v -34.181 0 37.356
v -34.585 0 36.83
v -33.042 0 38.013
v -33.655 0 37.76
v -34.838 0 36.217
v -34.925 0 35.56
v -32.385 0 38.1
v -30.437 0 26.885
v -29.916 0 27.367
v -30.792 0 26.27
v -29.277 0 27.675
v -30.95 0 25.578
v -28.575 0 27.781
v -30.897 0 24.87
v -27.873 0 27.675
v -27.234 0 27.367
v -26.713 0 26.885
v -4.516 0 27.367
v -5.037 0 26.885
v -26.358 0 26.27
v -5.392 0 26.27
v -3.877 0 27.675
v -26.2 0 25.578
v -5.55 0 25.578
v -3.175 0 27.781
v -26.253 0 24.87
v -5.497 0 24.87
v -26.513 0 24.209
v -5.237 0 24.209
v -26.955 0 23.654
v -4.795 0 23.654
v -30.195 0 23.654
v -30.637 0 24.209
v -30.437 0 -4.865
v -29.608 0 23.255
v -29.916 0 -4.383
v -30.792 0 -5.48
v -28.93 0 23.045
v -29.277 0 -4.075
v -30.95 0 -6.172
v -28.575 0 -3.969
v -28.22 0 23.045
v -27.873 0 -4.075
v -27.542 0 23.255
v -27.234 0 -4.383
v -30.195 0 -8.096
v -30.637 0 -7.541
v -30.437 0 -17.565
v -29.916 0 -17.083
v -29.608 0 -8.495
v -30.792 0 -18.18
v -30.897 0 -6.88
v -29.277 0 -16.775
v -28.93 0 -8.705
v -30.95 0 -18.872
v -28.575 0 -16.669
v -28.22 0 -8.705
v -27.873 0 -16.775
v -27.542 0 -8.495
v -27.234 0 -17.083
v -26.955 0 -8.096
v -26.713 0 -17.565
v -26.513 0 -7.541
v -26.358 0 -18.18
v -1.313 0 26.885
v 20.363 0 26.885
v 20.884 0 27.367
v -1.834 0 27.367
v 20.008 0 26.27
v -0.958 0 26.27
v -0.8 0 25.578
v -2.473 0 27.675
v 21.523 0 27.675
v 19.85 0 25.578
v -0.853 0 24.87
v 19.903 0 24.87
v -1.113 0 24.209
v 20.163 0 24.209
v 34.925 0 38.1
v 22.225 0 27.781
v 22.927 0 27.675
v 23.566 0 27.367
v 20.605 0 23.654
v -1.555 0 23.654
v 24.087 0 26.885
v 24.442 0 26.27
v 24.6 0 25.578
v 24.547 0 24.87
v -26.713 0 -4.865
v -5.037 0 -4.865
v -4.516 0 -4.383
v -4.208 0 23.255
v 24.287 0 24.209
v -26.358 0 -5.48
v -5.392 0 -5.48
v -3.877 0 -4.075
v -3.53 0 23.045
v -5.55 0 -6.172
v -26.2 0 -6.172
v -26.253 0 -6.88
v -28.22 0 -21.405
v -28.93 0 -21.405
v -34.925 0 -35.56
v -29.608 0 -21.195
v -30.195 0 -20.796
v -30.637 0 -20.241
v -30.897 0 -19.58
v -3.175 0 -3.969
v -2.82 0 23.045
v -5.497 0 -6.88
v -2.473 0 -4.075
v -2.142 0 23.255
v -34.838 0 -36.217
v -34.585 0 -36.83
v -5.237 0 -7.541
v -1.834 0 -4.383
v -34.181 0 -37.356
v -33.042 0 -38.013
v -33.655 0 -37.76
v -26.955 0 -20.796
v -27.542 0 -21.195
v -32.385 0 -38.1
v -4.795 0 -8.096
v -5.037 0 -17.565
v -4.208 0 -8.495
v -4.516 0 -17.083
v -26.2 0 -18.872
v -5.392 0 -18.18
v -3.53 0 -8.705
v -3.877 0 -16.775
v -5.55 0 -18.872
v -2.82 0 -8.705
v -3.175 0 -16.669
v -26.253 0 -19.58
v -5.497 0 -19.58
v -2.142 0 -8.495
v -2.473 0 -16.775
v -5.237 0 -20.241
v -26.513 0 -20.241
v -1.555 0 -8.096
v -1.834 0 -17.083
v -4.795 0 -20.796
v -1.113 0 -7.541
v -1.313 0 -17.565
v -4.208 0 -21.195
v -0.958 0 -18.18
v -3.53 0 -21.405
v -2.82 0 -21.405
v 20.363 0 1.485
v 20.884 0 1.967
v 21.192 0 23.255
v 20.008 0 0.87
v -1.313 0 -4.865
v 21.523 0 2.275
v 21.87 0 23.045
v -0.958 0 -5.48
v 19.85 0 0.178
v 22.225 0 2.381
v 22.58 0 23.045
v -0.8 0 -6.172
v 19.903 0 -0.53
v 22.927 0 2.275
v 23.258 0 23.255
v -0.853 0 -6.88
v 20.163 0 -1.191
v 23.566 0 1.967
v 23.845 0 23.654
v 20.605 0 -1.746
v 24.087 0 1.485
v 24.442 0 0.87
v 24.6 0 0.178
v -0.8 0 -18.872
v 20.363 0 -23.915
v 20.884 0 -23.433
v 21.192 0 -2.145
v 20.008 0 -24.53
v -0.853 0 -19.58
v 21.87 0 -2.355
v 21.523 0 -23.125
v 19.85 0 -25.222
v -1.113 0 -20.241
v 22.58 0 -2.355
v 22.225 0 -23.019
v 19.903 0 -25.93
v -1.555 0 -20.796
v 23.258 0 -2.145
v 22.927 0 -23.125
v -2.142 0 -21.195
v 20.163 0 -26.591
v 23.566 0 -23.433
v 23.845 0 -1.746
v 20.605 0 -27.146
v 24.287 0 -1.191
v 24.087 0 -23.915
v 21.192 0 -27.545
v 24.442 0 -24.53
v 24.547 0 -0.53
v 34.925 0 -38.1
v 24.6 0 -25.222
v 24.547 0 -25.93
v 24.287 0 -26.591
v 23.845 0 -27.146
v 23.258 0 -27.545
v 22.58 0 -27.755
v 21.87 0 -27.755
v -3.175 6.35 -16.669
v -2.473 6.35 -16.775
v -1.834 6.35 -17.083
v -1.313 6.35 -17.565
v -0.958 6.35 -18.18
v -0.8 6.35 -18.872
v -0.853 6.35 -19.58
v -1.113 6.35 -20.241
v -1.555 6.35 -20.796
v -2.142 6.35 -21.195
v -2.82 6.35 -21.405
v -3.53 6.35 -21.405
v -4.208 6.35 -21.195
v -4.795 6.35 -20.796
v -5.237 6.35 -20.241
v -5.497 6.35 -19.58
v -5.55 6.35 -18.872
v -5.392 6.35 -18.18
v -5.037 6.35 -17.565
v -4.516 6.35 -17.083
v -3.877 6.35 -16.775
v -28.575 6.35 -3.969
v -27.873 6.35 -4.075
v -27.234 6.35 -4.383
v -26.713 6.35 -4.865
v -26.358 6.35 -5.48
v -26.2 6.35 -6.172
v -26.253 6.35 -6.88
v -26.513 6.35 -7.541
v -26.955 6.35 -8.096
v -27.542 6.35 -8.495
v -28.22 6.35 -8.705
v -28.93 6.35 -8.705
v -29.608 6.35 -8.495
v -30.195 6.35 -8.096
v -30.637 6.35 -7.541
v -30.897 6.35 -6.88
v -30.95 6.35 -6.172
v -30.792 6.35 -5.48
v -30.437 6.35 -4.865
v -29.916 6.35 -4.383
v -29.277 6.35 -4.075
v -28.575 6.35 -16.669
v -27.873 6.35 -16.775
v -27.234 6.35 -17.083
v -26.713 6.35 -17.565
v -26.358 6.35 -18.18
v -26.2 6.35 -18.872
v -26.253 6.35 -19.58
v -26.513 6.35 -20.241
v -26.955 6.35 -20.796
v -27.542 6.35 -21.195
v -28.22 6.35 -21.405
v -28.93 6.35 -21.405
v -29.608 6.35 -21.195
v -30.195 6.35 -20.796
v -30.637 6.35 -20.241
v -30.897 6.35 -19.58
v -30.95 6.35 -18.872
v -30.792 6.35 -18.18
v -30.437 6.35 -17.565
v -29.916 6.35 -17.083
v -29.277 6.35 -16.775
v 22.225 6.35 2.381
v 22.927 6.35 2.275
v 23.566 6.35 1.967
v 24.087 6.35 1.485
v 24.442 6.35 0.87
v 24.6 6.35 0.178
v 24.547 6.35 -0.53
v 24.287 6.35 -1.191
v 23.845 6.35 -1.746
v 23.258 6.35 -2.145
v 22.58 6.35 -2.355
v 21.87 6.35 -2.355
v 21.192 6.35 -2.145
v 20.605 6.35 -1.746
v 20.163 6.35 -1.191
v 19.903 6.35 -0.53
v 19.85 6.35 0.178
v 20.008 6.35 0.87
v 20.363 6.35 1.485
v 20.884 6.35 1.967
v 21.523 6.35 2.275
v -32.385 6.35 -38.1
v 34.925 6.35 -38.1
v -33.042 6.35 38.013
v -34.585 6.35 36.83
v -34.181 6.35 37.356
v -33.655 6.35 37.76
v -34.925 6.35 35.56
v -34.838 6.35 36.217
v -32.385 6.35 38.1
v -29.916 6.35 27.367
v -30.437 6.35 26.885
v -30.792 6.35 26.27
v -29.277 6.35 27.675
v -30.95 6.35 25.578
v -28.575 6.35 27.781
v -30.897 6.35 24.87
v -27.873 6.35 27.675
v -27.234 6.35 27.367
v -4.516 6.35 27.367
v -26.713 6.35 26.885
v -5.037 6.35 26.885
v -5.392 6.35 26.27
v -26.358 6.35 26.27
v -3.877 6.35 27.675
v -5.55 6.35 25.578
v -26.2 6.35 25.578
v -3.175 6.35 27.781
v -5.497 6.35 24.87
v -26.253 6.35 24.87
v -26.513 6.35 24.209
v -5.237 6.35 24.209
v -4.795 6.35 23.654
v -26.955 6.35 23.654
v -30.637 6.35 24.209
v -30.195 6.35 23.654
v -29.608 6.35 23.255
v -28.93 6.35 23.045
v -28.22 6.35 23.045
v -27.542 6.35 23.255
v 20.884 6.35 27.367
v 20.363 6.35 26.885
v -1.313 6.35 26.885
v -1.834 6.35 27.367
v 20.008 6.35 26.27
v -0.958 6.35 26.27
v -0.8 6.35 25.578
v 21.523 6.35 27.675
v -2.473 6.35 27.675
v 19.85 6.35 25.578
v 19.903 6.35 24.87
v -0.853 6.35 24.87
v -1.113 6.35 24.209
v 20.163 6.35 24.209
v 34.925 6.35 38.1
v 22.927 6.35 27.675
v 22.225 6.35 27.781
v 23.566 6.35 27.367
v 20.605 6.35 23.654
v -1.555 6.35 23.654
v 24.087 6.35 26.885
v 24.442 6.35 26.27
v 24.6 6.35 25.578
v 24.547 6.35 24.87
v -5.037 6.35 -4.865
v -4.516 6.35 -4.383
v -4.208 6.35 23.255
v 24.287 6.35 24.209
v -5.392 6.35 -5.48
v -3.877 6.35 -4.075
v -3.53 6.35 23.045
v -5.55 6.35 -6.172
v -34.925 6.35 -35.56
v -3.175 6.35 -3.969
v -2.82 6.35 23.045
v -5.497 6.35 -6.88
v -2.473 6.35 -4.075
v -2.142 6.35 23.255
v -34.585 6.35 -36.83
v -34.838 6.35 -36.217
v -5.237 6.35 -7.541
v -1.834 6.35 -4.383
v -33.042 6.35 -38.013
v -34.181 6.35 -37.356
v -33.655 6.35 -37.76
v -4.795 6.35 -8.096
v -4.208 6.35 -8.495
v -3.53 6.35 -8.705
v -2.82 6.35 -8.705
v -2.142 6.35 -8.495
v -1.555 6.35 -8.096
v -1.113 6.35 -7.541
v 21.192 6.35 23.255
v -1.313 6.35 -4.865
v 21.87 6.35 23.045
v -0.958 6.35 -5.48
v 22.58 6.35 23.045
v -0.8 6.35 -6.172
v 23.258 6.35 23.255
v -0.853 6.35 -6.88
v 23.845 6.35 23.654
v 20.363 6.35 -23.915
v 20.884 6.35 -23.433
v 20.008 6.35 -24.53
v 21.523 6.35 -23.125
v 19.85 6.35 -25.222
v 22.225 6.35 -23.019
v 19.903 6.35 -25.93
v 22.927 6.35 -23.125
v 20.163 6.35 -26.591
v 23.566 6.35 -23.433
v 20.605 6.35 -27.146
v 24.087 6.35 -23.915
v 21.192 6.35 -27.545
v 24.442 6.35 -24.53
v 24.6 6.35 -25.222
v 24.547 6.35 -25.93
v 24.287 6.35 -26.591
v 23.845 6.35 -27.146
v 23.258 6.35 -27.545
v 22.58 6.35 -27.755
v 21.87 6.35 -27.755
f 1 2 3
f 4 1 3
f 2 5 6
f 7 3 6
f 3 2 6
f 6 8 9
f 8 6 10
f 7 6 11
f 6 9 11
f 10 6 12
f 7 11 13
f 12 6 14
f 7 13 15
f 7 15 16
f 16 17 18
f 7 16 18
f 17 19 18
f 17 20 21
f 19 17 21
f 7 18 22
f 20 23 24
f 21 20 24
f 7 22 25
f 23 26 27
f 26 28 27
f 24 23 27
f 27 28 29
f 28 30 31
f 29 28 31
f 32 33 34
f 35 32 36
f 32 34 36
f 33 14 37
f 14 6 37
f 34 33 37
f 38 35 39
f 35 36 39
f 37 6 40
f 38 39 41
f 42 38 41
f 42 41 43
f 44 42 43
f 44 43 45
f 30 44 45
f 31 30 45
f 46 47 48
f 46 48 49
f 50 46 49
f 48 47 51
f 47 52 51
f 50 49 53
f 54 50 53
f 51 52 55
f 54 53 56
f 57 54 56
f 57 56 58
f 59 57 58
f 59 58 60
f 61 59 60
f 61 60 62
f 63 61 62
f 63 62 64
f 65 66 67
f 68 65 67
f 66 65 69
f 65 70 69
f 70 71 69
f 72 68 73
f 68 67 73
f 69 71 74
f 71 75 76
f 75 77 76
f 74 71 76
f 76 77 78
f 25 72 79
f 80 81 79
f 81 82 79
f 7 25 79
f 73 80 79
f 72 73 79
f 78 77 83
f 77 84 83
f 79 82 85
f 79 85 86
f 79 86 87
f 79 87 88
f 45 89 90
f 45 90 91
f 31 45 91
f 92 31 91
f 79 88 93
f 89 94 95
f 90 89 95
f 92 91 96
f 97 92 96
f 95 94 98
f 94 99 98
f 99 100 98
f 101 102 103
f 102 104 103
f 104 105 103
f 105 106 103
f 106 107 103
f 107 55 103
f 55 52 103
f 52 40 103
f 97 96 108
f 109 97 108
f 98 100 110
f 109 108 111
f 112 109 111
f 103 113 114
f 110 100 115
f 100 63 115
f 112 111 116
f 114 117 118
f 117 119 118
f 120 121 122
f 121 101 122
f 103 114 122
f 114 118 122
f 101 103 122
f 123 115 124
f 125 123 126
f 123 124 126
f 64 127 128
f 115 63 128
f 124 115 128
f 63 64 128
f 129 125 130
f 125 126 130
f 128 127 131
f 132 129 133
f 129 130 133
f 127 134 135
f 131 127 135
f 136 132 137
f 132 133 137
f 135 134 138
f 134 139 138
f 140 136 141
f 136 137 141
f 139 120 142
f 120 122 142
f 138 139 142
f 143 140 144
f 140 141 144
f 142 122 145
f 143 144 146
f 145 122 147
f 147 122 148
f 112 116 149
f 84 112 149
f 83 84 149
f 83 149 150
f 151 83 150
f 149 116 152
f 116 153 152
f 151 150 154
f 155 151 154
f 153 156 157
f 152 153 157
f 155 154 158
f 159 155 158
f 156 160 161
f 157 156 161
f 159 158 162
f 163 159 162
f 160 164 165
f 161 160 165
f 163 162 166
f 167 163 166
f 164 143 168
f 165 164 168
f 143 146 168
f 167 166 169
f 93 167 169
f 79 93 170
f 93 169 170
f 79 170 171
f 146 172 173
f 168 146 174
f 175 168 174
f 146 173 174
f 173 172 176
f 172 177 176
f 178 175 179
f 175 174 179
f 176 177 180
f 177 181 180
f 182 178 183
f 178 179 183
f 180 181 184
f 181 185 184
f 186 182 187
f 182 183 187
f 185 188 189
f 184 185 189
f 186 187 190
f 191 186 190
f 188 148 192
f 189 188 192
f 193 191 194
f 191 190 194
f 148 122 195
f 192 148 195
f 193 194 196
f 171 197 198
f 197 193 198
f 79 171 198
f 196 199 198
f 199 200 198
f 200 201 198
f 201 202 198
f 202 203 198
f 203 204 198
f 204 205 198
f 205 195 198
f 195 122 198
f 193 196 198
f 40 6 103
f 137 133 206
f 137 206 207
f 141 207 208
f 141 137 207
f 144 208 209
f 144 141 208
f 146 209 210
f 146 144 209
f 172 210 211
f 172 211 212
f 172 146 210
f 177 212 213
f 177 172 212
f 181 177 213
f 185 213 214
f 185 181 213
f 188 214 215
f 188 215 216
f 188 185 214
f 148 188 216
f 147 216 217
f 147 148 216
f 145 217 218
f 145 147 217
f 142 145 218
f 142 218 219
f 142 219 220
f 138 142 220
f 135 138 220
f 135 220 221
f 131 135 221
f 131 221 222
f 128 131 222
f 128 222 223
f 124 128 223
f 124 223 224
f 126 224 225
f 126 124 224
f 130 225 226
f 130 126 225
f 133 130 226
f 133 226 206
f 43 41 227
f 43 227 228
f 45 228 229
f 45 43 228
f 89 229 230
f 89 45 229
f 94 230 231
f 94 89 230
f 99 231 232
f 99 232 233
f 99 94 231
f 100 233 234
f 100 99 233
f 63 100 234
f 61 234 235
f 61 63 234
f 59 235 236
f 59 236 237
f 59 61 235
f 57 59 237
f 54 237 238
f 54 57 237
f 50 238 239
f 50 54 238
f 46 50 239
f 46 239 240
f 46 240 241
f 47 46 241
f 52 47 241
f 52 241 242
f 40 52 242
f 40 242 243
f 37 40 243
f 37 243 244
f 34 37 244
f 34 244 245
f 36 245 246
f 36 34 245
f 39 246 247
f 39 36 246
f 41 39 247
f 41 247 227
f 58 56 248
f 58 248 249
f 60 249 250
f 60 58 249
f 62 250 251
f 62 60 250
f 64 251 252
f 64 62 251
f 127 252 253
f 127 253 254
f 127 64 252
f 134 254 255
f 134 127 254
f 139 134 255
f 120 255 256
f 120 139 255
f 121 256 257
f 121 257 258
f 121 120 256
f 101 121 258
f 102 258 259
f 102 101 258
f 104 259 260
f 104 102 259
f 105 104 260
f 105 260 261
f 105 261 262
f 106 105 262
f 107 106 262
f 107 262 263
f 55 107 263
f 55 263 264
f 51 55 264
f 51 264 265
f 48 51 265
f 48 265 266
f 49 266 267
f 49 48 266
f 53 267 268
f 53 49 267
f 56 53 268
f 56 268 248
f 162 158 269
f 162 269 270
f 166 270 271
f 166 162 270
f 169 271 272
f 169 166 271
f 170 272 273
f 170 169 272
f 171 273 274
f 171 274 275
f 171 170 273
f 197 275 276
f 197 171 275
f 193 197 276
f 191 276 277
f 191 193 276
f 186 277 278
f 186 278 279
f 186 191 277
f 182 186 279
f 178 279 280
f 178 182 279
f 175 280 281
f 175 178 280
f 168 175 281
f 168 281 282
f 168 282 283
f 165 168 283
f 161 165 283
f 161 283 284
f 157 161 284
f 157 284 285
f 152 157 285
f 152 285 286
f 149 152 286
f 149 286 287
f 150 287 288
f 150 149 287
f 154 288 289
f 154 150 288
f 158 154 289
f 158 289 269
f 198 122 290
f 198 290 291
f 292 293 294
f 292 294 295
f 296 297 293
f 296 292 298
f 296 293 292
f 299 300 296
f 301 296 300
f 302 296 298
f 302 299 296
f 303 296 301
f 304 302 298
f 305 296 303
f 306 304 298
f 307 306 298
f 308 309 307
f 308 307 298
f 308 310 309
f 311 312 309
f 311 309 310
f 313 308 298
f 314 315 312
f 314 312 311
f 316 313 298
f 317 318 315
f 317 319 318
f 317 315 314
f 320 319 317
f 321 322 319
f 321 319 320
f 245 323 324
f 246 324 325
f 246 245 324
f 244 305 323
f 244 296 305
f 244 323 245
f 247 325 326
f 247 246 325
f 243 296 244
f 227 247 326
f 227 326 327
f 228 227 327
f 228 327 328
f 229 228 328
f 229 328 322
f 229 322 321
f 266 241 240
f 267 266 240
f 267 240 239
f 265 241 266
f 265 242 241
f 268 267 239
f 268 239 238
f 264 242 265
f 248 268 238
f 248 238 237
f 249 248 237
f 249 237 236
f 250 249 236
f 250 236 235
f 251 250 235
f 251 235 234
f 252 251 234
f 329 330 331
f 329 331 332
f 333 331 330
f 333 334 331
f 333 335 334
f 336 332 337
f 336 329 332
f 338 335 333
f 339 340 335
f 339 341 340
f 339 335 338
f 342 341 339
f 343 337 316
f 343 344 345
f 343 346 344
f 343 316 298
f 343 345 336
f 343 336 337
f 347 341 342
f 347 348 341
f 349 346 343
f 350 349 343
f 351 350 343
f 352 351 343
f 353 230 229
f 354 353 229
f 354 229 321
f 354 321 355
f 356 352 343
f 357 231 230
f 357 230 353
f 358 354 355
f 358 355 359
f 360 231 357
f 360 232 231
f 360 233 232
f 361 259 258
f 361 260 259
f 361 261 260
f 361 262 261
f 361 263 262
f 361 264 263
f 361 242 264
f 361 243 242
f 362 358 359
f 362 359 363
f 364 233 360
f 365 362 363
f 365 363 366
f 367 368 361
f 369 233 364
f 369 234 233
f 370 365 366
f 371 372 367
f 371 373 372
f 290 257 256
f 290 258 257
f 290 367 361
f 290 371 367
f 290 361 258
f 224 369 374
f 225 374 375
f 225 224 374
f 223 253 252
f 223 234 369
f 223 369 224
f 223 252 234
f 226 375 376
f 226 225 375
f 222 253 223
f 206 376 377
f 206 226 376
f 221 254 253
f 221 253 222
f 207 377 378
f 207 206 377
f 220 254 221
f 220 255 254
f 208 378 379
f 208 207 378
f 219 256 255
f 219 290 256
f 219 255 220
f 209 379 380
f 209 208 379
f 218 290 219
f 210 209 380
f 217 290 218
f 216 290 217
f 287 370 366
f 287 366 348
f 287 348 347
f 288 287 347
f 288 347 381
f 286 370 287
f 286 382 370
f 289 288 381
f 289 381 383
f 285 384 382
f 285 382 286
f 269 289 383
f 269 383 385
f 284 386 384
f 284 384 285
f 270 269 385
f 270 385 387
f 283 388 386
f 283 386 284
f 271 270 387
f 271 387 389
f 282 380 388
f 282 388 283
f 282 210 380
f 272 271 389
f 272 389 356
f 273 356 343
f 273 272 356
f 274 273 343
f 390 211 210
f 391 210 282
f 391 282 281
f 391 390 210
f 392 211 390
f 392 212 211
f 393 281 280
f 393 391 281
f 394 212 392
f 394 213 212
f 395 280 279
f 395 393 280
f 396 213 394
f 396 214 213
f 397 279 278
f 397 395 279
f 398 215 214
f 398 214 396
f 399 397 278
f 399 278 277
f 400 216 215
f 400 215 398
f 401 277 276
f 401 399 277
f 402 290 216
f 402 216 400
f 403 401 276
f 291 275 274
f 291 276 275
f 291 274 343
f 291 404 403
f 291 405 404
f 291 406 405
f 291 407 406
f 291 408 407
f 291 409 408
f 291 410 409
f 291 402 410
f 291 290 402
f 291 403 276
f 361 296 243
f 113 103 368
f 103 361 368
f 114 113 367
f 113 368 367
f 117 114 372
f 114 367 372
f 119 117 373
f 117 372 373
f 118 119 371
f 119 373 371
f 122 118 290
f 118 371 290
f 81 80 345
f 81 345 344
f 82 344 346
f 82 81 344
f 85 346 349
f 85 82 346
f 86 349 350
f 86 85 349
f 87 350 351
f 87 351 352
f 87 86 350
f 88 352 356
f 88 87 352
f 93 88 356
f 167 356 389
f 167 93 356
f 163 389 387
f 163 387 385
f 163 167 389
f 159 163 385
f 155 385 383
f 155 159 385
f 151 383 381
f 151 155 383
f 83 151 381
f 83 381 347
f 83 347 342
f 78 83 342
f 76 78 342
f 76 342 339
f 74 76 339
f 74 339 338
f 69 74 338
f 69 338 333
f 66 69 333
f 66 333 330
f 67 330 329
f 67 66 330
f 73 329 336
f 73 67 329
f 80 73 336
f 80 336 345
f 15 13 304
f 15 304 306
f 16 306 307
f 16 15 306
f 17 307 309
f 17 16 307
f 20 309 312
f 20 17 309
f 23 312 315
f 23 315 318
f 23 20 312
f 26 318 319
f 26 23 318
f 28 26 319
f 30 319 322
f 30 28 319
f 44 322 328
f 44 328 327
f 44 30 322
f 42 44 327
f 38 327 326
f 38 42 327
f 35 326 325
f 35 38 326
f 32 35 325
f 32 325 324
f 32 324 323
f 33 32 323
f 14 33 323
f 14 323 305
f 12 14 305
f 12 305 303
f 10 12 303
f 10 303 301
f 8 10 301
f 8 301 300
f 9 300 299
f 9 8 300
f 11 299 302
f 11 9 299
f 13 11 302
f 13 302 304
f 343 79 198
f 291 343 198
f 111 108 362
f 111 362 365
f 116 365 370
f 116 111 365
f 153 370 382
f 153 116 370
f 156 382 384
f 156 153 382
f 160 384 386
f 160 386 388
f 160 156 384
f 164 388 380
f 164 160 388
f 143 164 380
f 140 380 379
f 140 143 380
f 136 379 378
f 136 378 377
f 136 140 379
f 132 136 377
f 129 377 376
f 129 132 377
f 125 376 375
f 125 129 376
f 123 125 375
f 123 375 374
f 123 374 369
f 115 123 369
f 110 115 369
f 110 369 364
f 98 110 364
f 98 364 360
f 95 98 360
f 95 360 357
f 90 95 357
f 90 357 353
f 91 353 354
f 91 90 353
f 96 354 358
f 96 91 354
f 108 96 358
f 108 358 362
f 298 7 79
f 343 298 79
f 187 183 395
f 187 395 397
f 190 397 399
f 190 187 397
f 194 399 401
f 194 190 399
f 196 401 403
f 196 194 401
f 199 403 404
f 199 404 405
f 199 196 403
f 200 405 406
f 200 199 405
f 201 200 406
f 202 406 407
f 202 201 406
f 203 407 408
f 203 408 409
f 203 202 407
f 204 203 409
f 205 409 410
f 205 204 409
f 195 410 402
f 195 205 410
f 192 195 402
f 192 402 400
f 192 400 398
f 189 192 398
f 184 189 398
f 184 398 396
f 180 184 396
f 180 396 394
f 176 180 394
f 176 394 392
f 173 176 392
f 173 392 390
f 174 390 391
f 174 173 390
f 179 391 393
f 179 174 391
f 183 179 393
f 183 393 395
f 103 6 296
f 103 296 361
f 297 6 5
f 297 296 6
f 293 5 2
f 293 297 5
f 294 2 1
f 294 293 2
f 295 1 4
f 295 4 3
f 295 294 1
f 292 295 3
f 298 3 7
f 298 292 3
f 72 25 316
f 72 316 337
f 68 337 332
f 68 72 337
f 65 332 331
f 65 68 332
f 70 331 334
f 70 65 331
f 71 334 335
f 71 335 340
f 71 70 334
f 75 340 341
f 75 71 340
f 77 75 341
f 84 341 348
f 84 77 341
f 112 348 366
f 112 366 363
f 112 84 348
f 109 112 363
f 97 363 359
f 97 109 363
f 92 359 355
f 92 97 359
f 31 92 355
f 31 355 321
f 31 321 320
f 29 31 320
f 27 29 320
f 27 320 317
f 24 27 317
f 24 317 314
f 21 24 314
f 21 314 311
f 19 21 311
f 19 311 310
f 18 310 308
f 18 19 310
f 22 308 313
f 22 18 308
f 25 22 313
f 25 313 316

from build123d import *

# Parameters (mm, degrees)
SKETCH1_W           = 69.85
SKETCH1_H           = 76.2
SKETCH1_R           = 2.38125
BOSS_EXTRUDE1_DEPTH = 6.35
FILLET1_R           = 2.54


with BuildPart() as part:
    # Sketch1 → Boss-Extrude1 (new body)
    with BuildSketch(Plane(origin=(0, 0, 0), x_dir=(1, 0, 0), z_dir=(0, 1, 0))):
        Rectangle(SKETCH1_W, SKETCH1_H)
        with Locations(Location((22.225, 0, 0), (0, 0, 270))):
            Circle(SKETCH1_R, mode=Mode.SUBTRACT)
        with Locations(Location((22.225, -25.4, 0), (0, 0, 270))):
            Circle(SKETCH1_R, mode=Mode.SUBTRACT)
        with Locations(Location((22.225, 25.4, 0), (0, 0, 270))):
            Circle(SKETCH1_R, mode=Mode.SUBTRACT)
        with Locations(Location((-28.575, -25.4, 0), (0, 0, 270))):
            Circle(SKETCH1_R, mode=Mode.SUBTRACT)
        with Locations(Location((-28.575, 19.05, 0), (0, 0, 270))):
            Circle(SKETCH1_R, mode=Mode.SUBTRACT)
        with Locations(Location((-28.575, 6.35, 0), (0, 0, 270))):
            Circle(SKETCH1_R, mode=Mode.SUBTRACT)
        with Locations(Location((-3.175, -25.4, 0), (0, 0, 270))):
            Circle(SKETCH1_R, mode=Mode.SUBTRACT)
        with Locations(Location((-3.175, 19.05, 0), (0, 0, 270))):
            Circle(SKETCH1_R, mode=Mode.SUBTRACT)
        with Locations(Location((-3.175, 6.35, 0), (0, 0, 270))):
            Circle(SKETCH1_R, mode=Mode.SUBTRACT)
    extrude(amount=BOSS_EXTRUDE1_DEPTH)

    # Fillet1
    fillet1_edges = [part.edges().sort_by_distance(p)[0] for p in [
        (-34.925, 3.175, 38.1),
        (-34.925, 3.175, -38.1),
    ]]
    fillet(fillet1_edges, radius=FILLET1_R)


solid = part.part
